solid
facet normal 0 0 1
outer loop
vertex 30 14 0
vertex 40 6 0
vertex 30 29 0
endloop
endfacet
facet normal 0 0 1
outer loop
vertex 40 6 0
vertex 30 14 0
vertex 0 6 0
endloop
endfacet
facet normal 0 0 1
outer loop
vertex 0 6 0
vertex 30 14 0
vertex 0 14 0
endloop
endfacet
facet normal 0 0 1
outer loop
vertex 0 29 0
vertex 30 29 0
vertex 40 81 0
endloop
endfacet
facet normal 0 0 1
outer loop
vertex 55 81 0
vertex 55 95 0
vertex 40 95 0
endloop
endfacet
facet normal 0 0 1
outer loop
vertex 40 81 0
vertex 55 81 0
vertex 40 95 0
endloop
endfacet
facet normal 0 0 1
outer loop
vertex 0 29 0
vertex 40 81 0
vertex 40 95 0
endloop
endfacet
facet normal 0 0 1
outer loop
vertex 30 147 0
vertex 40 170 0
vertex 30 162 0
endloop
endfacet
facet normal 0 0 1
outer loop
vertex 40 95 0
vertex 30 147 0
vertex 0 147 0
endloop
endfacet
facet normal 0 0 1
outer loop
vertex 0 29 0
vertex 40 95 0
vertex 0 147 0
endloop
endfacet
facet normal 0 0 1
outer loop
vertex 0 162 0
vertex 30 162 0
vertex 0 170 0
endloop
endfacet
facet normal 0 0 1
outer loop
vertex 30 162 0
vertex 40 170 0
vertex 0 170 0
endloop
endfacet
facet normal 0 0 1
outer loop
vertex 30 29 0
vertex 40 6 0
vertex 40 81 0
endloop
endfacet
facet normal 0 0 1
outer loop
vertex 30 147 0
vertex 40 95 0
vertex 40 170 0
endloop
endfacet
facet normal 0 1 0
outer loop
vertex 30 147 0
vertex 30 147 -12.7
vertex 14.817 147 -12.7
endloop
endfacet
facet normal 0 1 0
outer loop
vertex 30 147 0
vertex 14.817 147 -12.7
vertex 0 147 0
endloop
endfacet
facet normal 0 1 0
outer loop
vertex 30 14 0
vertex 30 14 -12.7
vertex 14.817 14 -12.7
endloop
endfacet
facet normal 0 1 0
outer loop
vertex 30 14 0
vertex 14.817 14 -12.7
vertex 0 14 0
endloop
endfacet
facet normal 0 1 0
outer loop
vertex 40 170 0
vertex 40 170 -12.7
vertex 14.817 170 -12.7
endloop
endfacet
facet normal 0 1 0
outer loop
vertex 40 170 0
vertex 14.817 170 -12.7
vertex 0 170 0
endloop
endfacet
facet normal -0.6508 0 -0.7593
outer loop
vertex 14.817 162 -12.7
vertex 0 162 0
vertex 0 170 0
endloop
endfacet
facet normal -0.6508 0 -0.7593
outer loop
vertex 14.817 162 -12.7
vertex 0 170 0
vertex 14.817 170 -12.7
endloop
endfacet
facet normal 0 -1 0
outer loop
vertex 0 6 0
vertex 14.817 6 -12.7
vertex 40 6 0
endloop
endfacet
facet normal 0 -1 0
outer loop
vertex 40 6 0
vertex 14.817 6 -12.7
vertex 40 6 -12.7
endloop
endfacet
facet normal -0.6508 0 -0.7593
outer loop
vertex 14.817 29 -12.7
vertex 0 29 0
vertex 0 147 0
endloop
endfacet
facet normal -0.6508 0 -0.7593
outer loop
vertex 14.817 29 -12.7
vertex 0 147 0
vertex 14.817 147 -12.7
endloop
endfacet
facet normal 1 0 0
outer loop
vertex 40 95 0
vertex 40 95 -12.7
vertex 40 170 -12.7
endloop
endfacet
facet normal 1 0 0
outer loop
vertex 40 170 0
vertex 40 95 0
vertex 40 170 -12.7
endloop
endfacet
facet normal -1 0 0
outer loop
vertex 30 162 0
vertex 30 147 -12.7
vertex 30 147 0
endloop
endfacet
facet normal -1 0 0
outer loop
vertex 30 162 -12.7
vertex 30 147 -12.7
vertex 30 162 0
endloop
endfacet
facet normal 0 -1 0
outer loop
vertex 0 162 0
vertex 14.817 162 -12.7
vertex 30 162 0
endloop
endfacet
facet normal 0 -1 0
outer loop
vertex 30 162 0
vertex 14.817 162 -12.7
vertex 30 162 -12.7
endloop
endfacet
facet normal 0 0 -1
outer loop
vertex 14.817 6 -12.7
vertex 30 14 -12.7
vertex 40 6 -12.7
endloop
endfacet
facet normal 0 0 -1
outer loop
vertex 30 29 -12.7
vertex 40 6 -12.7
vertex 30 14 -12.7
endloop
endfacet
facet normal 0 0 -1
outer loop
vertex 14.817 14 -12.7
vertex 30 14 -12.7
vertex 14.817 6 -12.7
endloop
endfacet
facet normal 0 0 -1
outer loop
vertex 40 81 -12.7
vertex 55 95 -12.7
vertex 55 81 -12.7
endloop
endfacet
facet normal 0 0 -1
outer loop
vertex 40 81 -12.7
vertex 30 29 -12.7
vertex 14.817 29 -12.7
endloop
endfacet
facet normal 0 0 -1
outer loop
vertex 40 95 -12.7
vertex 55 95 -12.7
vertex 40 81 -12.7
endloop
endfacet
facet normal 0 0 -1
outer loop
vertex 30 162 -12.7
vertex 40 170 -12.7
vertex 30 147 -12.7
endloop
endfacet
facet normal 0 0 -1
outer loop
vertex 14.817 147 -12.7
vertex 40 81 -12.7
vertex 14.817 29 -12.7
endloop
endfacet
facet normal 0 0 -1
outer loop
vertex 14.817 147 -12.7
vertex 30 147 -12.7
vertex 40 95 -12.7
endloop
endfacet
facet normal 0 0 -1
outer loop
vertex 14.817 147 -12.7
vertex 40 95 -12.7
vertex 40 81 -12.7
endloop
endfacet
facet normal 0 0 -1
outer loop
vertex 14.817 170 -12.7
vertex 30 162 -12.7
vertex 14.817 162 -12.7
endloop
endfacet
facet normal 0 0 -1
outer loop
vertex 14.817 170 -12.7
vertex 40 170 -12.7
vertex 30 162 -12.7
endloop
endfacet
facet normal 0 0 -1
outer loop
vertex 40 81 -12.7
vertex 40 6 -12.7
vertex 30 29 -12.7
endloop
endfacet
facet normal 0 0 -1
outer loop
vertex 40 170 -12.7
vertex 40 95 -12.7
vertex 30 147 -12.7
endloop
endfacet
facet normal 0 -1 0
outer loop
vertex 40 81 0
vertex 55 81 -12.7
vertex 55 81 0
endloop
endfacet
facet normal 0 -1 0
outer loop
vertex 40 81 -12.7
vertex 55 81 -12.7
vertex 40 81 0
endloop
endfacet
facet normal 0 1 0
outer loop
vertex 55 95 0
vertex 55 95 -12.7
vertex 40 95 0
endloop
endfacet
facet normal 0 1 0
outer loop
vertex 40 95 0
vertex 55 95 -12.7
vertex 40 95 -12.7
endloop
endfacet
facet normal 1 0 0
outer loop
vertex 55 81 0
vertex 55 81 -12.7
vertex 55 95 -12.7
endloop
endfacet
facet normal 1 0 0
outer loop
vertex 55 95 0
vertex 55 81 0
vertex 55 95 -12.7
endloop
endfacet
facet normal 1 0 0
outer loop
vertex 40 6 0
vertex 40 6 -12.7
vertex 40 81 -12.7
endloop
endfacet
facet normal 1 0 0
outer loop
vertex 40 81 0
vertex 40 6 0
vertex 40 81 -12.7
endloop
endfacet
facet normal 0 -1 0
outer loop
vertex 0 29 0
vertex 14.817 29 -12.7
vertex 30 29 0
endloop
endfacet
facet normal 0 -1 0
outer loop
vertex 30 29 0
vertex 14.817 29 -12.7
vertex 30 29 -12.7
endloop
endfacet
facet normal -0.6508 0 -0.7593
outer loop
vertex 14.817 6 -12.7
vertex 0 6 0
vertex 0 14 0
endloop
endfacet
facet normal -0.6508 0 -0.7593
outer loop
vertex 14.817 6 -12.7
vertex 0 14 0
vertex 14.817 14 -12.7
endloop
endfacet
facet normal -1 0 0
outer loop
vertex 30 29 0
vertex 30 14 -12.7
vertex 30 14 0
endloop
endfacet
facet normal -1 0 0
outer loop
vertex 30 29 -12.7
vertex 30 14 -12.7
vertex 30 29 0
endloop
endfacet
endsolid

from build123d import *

# Parameters (mm, degrees)
SALIENTE_EXTRUIR1_DEPTH    = 170
CROQUIS2_W                 = 8
CROQUIS2_H                 = 27
CORTAR_EXTRUIR1_DEPTH      = 1
CORTAR_EXTRUIR1_DEPTH_BACK = 16
CROQUIS3_W                 = 38.06511858
CROQUIS3_H                 = 175.826127046
CORTAR_EXTRUIR2_DEPTH      = 1
CORTAR_EXTRUIR2_DEPTH_BACK = 16
CROQUIS4_W                 = 35.532251822
CROQUIS4_H                 = 7.536766594
CORTAR_EXTRUIR3_DEPTH      = 1
CORTAR_EXTRUIR3_DEPTH_BACK = 171
CROQUIS5_W                 = 14.817344245
CROQUIS5_H                 = 15
CROQUIS5_W_2               = 15.182655755
CROQUIS5_W_3               = 6
CROQUIS5_H_2               = 75
CROQUIS5_H_3               = 6
CORTAR_EXTRUIR4_DEPTH      = 1
CORTAR_EXTRUIR4_DEPTH_BACK = 13.7
CROQUIS6_W                 = 9
CROQUIS6_H                 = 14
SALIENTE_EXTRUIR2_DEPTH    = 12.7


with BuildPart() as part:
    # Croquis1 → Saliente-Extruir1 (new body)
    with BuildSketch(Plane(origin=(0, 0, 0), x_dir=(1, 0, 0), z_dir=(0, 1, 0))):
        Polygon((0, 0), (17.50080029, 15), (60, 15), (60, 0), align=None)
    extrude(amount=SALIENTE_EXTRUIR1_DEPTH)

    # Croquis2 → Cortar-Extruir1 (cut, two sides)
    with BuildSketch(Plane(origin=(0, 0, -15), x_dir=(-1, 0, 0), z_dir=(0, 0, -1))) as cortar_extruir1_sk:
        with Locations((-56, 13.5)):
            Rectangle(CROQUIS2_W, CROQUIS2_H)
        with Locations((-56, 156.5)):
            Rectangle(CROQUIS2_W, CROQUIS2_H)
    extrude(amount=CORTAR_EXTRUIR1_DEPTH, mode=Mode.SUBTRACT)
    extrude(cortar_extruir1_sk.sketch, amount=-CORTAR_EXTRUIR1_DEPTH_BACK, mode=Mode.SUBTRACT)

    # Croquis3 → Cortar-Extruir2 (cut, two sides)
    with BuildSketch(Plane(origin=(0, 0, -15), x_dir=(-1, 0, 0), z_dir=(0, 0, -1))) as cortar_extruir2_sk:
        with Locations((-65.03255929, 82.086936477)):
            Rectangle(CROQUIS3_W, CROQUIS3_H)
    extrude(amount=CORTAR_EXTRUIR2_DEPTH, mode=Mode.SUBTRACT)
    extrude(cortar_extruir2_sk.sketch, amount=-CORTAR_EXTRUIR2_DEPTH_BACK, mode=Mode.SUBTRACT)

    # Croquis4 → Cortar-Extruir3 (cut, two sides)
    with BuildSketch(Plane.XZ) as cortar_extruir3_sk:
        with Locations((28.233874089, -16.468383297)):
            Rectangle(CROQUIS4_W, CROQUIS4_H)
    extrude(amount=CORTAR_EXTRUIR3_DEPTH, mode=Mode.SUBTRACT)
    extrude(cortar_extruir3_sk.sketch, amount=-CORTAR_EXTRUIR3_DEPTH_BACK, mode=Mode.SUBTRACT)

    # Croquis5 → Cortar-Extruir4 (cut, two sides)
    with BuildSketch(Plane(origin=(0, 0, -12.7), x_dir=(-1, 0, 0), z_dir=(0, 0, -1))) as cortar_extruir4_sk:
        with Locations((-7.408672123, 21.5)):
            Rectangle(CROQUIS5_W, CROQUIS5_H)
        with Locations((-22.408672123, 21.5)):
            Rectangle(CROQUIS5_W_2, CROQUIS5_H)
        with Locations((-43, 43.5)):
            Rectangle(CROQUIS5_W_3, CROQUIS5_H_2)
        Polygon((-40, 6), (-46, 6), (-46, 0), (-14.817344245, 0), (-14.817344245, 6), align=None)
        with Locations((-7.408672123, 3)):
            Rectangle(CROQUIS5_W, CROQUIS5_H_3)
        with Locations((-43, 132.5)):
            Rectangle(CROQUIS5_W_3, CROQUIS5_H_2)
        with Locations((-22.408672123, 154.5)):
            Rectangle(CROQUIS5_W_2, CROQUIS5_H)
        with Locations((-7.408672123, 154.5)):
            Rectangle(CROQUIS5_W, CROQUIS5_H)
    extrude(amount=CORTAR_EXTRUIR4_DEPTH, mode=Mode.SUBTRACT)
    extrude(cortar_extruir4_sk.sketch, amount=-CORTAR_EXTRUIR4_DEPTH_BACK, mode=Mode.SUBTRACT)

    # Croquis6 → Saliente-Extruir2 (add)
    with BuildSketch(Plane(origin=(0, 0, -12.7), x_dir=(-1, 0, 0), z_dir=(0, 0, -1))):
        with Locations((-50.5, 88)):
            Rectangle(CROQUIS6_W, CROQUIS6_H)
    extrude(amount=-SALIENTE_EXTRUIR2_DEPTH)


solid = part.part
